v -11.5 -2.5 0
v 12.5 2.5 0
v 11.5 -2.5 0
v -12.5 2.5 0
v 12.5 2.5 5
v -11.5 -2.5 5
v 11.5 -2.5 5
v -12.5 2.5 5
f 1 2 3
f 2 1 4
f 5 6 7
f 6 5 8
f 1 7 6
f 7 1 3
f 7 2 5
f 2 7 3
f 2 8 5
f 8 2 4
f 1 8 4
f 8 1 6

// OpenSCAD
// Rectangular shaft key with chamfered ends.
$fn = 60;
eps = 0.02;
key_w = 5;
key_h = 5;
key_l = 25;
chamfer = 1;
polyhedron(points = [
    [-key_l / 2 + chamfer, -key_w / 2, 0], [key_l / 2 - chamfer, -key_w / 2, 0], [key_l / 2, key_w / 2, 0], [-key_l / 2, key_w / 2, 0],
    [-key_l / 2 + chamfer, -key_w / 2, key_h], [key_l / 2 - chamfer, -key_w / 2, key_h], [key_l / 2, key_w / 2, key_h], [-key_l / 2, key_w / 2, key_h]
], faces = [[0,1,2,3],[4,7,6,5],[0,4,5,1],[1,5,6,2],[2,6,7,3],[3,7,4,0]]);
